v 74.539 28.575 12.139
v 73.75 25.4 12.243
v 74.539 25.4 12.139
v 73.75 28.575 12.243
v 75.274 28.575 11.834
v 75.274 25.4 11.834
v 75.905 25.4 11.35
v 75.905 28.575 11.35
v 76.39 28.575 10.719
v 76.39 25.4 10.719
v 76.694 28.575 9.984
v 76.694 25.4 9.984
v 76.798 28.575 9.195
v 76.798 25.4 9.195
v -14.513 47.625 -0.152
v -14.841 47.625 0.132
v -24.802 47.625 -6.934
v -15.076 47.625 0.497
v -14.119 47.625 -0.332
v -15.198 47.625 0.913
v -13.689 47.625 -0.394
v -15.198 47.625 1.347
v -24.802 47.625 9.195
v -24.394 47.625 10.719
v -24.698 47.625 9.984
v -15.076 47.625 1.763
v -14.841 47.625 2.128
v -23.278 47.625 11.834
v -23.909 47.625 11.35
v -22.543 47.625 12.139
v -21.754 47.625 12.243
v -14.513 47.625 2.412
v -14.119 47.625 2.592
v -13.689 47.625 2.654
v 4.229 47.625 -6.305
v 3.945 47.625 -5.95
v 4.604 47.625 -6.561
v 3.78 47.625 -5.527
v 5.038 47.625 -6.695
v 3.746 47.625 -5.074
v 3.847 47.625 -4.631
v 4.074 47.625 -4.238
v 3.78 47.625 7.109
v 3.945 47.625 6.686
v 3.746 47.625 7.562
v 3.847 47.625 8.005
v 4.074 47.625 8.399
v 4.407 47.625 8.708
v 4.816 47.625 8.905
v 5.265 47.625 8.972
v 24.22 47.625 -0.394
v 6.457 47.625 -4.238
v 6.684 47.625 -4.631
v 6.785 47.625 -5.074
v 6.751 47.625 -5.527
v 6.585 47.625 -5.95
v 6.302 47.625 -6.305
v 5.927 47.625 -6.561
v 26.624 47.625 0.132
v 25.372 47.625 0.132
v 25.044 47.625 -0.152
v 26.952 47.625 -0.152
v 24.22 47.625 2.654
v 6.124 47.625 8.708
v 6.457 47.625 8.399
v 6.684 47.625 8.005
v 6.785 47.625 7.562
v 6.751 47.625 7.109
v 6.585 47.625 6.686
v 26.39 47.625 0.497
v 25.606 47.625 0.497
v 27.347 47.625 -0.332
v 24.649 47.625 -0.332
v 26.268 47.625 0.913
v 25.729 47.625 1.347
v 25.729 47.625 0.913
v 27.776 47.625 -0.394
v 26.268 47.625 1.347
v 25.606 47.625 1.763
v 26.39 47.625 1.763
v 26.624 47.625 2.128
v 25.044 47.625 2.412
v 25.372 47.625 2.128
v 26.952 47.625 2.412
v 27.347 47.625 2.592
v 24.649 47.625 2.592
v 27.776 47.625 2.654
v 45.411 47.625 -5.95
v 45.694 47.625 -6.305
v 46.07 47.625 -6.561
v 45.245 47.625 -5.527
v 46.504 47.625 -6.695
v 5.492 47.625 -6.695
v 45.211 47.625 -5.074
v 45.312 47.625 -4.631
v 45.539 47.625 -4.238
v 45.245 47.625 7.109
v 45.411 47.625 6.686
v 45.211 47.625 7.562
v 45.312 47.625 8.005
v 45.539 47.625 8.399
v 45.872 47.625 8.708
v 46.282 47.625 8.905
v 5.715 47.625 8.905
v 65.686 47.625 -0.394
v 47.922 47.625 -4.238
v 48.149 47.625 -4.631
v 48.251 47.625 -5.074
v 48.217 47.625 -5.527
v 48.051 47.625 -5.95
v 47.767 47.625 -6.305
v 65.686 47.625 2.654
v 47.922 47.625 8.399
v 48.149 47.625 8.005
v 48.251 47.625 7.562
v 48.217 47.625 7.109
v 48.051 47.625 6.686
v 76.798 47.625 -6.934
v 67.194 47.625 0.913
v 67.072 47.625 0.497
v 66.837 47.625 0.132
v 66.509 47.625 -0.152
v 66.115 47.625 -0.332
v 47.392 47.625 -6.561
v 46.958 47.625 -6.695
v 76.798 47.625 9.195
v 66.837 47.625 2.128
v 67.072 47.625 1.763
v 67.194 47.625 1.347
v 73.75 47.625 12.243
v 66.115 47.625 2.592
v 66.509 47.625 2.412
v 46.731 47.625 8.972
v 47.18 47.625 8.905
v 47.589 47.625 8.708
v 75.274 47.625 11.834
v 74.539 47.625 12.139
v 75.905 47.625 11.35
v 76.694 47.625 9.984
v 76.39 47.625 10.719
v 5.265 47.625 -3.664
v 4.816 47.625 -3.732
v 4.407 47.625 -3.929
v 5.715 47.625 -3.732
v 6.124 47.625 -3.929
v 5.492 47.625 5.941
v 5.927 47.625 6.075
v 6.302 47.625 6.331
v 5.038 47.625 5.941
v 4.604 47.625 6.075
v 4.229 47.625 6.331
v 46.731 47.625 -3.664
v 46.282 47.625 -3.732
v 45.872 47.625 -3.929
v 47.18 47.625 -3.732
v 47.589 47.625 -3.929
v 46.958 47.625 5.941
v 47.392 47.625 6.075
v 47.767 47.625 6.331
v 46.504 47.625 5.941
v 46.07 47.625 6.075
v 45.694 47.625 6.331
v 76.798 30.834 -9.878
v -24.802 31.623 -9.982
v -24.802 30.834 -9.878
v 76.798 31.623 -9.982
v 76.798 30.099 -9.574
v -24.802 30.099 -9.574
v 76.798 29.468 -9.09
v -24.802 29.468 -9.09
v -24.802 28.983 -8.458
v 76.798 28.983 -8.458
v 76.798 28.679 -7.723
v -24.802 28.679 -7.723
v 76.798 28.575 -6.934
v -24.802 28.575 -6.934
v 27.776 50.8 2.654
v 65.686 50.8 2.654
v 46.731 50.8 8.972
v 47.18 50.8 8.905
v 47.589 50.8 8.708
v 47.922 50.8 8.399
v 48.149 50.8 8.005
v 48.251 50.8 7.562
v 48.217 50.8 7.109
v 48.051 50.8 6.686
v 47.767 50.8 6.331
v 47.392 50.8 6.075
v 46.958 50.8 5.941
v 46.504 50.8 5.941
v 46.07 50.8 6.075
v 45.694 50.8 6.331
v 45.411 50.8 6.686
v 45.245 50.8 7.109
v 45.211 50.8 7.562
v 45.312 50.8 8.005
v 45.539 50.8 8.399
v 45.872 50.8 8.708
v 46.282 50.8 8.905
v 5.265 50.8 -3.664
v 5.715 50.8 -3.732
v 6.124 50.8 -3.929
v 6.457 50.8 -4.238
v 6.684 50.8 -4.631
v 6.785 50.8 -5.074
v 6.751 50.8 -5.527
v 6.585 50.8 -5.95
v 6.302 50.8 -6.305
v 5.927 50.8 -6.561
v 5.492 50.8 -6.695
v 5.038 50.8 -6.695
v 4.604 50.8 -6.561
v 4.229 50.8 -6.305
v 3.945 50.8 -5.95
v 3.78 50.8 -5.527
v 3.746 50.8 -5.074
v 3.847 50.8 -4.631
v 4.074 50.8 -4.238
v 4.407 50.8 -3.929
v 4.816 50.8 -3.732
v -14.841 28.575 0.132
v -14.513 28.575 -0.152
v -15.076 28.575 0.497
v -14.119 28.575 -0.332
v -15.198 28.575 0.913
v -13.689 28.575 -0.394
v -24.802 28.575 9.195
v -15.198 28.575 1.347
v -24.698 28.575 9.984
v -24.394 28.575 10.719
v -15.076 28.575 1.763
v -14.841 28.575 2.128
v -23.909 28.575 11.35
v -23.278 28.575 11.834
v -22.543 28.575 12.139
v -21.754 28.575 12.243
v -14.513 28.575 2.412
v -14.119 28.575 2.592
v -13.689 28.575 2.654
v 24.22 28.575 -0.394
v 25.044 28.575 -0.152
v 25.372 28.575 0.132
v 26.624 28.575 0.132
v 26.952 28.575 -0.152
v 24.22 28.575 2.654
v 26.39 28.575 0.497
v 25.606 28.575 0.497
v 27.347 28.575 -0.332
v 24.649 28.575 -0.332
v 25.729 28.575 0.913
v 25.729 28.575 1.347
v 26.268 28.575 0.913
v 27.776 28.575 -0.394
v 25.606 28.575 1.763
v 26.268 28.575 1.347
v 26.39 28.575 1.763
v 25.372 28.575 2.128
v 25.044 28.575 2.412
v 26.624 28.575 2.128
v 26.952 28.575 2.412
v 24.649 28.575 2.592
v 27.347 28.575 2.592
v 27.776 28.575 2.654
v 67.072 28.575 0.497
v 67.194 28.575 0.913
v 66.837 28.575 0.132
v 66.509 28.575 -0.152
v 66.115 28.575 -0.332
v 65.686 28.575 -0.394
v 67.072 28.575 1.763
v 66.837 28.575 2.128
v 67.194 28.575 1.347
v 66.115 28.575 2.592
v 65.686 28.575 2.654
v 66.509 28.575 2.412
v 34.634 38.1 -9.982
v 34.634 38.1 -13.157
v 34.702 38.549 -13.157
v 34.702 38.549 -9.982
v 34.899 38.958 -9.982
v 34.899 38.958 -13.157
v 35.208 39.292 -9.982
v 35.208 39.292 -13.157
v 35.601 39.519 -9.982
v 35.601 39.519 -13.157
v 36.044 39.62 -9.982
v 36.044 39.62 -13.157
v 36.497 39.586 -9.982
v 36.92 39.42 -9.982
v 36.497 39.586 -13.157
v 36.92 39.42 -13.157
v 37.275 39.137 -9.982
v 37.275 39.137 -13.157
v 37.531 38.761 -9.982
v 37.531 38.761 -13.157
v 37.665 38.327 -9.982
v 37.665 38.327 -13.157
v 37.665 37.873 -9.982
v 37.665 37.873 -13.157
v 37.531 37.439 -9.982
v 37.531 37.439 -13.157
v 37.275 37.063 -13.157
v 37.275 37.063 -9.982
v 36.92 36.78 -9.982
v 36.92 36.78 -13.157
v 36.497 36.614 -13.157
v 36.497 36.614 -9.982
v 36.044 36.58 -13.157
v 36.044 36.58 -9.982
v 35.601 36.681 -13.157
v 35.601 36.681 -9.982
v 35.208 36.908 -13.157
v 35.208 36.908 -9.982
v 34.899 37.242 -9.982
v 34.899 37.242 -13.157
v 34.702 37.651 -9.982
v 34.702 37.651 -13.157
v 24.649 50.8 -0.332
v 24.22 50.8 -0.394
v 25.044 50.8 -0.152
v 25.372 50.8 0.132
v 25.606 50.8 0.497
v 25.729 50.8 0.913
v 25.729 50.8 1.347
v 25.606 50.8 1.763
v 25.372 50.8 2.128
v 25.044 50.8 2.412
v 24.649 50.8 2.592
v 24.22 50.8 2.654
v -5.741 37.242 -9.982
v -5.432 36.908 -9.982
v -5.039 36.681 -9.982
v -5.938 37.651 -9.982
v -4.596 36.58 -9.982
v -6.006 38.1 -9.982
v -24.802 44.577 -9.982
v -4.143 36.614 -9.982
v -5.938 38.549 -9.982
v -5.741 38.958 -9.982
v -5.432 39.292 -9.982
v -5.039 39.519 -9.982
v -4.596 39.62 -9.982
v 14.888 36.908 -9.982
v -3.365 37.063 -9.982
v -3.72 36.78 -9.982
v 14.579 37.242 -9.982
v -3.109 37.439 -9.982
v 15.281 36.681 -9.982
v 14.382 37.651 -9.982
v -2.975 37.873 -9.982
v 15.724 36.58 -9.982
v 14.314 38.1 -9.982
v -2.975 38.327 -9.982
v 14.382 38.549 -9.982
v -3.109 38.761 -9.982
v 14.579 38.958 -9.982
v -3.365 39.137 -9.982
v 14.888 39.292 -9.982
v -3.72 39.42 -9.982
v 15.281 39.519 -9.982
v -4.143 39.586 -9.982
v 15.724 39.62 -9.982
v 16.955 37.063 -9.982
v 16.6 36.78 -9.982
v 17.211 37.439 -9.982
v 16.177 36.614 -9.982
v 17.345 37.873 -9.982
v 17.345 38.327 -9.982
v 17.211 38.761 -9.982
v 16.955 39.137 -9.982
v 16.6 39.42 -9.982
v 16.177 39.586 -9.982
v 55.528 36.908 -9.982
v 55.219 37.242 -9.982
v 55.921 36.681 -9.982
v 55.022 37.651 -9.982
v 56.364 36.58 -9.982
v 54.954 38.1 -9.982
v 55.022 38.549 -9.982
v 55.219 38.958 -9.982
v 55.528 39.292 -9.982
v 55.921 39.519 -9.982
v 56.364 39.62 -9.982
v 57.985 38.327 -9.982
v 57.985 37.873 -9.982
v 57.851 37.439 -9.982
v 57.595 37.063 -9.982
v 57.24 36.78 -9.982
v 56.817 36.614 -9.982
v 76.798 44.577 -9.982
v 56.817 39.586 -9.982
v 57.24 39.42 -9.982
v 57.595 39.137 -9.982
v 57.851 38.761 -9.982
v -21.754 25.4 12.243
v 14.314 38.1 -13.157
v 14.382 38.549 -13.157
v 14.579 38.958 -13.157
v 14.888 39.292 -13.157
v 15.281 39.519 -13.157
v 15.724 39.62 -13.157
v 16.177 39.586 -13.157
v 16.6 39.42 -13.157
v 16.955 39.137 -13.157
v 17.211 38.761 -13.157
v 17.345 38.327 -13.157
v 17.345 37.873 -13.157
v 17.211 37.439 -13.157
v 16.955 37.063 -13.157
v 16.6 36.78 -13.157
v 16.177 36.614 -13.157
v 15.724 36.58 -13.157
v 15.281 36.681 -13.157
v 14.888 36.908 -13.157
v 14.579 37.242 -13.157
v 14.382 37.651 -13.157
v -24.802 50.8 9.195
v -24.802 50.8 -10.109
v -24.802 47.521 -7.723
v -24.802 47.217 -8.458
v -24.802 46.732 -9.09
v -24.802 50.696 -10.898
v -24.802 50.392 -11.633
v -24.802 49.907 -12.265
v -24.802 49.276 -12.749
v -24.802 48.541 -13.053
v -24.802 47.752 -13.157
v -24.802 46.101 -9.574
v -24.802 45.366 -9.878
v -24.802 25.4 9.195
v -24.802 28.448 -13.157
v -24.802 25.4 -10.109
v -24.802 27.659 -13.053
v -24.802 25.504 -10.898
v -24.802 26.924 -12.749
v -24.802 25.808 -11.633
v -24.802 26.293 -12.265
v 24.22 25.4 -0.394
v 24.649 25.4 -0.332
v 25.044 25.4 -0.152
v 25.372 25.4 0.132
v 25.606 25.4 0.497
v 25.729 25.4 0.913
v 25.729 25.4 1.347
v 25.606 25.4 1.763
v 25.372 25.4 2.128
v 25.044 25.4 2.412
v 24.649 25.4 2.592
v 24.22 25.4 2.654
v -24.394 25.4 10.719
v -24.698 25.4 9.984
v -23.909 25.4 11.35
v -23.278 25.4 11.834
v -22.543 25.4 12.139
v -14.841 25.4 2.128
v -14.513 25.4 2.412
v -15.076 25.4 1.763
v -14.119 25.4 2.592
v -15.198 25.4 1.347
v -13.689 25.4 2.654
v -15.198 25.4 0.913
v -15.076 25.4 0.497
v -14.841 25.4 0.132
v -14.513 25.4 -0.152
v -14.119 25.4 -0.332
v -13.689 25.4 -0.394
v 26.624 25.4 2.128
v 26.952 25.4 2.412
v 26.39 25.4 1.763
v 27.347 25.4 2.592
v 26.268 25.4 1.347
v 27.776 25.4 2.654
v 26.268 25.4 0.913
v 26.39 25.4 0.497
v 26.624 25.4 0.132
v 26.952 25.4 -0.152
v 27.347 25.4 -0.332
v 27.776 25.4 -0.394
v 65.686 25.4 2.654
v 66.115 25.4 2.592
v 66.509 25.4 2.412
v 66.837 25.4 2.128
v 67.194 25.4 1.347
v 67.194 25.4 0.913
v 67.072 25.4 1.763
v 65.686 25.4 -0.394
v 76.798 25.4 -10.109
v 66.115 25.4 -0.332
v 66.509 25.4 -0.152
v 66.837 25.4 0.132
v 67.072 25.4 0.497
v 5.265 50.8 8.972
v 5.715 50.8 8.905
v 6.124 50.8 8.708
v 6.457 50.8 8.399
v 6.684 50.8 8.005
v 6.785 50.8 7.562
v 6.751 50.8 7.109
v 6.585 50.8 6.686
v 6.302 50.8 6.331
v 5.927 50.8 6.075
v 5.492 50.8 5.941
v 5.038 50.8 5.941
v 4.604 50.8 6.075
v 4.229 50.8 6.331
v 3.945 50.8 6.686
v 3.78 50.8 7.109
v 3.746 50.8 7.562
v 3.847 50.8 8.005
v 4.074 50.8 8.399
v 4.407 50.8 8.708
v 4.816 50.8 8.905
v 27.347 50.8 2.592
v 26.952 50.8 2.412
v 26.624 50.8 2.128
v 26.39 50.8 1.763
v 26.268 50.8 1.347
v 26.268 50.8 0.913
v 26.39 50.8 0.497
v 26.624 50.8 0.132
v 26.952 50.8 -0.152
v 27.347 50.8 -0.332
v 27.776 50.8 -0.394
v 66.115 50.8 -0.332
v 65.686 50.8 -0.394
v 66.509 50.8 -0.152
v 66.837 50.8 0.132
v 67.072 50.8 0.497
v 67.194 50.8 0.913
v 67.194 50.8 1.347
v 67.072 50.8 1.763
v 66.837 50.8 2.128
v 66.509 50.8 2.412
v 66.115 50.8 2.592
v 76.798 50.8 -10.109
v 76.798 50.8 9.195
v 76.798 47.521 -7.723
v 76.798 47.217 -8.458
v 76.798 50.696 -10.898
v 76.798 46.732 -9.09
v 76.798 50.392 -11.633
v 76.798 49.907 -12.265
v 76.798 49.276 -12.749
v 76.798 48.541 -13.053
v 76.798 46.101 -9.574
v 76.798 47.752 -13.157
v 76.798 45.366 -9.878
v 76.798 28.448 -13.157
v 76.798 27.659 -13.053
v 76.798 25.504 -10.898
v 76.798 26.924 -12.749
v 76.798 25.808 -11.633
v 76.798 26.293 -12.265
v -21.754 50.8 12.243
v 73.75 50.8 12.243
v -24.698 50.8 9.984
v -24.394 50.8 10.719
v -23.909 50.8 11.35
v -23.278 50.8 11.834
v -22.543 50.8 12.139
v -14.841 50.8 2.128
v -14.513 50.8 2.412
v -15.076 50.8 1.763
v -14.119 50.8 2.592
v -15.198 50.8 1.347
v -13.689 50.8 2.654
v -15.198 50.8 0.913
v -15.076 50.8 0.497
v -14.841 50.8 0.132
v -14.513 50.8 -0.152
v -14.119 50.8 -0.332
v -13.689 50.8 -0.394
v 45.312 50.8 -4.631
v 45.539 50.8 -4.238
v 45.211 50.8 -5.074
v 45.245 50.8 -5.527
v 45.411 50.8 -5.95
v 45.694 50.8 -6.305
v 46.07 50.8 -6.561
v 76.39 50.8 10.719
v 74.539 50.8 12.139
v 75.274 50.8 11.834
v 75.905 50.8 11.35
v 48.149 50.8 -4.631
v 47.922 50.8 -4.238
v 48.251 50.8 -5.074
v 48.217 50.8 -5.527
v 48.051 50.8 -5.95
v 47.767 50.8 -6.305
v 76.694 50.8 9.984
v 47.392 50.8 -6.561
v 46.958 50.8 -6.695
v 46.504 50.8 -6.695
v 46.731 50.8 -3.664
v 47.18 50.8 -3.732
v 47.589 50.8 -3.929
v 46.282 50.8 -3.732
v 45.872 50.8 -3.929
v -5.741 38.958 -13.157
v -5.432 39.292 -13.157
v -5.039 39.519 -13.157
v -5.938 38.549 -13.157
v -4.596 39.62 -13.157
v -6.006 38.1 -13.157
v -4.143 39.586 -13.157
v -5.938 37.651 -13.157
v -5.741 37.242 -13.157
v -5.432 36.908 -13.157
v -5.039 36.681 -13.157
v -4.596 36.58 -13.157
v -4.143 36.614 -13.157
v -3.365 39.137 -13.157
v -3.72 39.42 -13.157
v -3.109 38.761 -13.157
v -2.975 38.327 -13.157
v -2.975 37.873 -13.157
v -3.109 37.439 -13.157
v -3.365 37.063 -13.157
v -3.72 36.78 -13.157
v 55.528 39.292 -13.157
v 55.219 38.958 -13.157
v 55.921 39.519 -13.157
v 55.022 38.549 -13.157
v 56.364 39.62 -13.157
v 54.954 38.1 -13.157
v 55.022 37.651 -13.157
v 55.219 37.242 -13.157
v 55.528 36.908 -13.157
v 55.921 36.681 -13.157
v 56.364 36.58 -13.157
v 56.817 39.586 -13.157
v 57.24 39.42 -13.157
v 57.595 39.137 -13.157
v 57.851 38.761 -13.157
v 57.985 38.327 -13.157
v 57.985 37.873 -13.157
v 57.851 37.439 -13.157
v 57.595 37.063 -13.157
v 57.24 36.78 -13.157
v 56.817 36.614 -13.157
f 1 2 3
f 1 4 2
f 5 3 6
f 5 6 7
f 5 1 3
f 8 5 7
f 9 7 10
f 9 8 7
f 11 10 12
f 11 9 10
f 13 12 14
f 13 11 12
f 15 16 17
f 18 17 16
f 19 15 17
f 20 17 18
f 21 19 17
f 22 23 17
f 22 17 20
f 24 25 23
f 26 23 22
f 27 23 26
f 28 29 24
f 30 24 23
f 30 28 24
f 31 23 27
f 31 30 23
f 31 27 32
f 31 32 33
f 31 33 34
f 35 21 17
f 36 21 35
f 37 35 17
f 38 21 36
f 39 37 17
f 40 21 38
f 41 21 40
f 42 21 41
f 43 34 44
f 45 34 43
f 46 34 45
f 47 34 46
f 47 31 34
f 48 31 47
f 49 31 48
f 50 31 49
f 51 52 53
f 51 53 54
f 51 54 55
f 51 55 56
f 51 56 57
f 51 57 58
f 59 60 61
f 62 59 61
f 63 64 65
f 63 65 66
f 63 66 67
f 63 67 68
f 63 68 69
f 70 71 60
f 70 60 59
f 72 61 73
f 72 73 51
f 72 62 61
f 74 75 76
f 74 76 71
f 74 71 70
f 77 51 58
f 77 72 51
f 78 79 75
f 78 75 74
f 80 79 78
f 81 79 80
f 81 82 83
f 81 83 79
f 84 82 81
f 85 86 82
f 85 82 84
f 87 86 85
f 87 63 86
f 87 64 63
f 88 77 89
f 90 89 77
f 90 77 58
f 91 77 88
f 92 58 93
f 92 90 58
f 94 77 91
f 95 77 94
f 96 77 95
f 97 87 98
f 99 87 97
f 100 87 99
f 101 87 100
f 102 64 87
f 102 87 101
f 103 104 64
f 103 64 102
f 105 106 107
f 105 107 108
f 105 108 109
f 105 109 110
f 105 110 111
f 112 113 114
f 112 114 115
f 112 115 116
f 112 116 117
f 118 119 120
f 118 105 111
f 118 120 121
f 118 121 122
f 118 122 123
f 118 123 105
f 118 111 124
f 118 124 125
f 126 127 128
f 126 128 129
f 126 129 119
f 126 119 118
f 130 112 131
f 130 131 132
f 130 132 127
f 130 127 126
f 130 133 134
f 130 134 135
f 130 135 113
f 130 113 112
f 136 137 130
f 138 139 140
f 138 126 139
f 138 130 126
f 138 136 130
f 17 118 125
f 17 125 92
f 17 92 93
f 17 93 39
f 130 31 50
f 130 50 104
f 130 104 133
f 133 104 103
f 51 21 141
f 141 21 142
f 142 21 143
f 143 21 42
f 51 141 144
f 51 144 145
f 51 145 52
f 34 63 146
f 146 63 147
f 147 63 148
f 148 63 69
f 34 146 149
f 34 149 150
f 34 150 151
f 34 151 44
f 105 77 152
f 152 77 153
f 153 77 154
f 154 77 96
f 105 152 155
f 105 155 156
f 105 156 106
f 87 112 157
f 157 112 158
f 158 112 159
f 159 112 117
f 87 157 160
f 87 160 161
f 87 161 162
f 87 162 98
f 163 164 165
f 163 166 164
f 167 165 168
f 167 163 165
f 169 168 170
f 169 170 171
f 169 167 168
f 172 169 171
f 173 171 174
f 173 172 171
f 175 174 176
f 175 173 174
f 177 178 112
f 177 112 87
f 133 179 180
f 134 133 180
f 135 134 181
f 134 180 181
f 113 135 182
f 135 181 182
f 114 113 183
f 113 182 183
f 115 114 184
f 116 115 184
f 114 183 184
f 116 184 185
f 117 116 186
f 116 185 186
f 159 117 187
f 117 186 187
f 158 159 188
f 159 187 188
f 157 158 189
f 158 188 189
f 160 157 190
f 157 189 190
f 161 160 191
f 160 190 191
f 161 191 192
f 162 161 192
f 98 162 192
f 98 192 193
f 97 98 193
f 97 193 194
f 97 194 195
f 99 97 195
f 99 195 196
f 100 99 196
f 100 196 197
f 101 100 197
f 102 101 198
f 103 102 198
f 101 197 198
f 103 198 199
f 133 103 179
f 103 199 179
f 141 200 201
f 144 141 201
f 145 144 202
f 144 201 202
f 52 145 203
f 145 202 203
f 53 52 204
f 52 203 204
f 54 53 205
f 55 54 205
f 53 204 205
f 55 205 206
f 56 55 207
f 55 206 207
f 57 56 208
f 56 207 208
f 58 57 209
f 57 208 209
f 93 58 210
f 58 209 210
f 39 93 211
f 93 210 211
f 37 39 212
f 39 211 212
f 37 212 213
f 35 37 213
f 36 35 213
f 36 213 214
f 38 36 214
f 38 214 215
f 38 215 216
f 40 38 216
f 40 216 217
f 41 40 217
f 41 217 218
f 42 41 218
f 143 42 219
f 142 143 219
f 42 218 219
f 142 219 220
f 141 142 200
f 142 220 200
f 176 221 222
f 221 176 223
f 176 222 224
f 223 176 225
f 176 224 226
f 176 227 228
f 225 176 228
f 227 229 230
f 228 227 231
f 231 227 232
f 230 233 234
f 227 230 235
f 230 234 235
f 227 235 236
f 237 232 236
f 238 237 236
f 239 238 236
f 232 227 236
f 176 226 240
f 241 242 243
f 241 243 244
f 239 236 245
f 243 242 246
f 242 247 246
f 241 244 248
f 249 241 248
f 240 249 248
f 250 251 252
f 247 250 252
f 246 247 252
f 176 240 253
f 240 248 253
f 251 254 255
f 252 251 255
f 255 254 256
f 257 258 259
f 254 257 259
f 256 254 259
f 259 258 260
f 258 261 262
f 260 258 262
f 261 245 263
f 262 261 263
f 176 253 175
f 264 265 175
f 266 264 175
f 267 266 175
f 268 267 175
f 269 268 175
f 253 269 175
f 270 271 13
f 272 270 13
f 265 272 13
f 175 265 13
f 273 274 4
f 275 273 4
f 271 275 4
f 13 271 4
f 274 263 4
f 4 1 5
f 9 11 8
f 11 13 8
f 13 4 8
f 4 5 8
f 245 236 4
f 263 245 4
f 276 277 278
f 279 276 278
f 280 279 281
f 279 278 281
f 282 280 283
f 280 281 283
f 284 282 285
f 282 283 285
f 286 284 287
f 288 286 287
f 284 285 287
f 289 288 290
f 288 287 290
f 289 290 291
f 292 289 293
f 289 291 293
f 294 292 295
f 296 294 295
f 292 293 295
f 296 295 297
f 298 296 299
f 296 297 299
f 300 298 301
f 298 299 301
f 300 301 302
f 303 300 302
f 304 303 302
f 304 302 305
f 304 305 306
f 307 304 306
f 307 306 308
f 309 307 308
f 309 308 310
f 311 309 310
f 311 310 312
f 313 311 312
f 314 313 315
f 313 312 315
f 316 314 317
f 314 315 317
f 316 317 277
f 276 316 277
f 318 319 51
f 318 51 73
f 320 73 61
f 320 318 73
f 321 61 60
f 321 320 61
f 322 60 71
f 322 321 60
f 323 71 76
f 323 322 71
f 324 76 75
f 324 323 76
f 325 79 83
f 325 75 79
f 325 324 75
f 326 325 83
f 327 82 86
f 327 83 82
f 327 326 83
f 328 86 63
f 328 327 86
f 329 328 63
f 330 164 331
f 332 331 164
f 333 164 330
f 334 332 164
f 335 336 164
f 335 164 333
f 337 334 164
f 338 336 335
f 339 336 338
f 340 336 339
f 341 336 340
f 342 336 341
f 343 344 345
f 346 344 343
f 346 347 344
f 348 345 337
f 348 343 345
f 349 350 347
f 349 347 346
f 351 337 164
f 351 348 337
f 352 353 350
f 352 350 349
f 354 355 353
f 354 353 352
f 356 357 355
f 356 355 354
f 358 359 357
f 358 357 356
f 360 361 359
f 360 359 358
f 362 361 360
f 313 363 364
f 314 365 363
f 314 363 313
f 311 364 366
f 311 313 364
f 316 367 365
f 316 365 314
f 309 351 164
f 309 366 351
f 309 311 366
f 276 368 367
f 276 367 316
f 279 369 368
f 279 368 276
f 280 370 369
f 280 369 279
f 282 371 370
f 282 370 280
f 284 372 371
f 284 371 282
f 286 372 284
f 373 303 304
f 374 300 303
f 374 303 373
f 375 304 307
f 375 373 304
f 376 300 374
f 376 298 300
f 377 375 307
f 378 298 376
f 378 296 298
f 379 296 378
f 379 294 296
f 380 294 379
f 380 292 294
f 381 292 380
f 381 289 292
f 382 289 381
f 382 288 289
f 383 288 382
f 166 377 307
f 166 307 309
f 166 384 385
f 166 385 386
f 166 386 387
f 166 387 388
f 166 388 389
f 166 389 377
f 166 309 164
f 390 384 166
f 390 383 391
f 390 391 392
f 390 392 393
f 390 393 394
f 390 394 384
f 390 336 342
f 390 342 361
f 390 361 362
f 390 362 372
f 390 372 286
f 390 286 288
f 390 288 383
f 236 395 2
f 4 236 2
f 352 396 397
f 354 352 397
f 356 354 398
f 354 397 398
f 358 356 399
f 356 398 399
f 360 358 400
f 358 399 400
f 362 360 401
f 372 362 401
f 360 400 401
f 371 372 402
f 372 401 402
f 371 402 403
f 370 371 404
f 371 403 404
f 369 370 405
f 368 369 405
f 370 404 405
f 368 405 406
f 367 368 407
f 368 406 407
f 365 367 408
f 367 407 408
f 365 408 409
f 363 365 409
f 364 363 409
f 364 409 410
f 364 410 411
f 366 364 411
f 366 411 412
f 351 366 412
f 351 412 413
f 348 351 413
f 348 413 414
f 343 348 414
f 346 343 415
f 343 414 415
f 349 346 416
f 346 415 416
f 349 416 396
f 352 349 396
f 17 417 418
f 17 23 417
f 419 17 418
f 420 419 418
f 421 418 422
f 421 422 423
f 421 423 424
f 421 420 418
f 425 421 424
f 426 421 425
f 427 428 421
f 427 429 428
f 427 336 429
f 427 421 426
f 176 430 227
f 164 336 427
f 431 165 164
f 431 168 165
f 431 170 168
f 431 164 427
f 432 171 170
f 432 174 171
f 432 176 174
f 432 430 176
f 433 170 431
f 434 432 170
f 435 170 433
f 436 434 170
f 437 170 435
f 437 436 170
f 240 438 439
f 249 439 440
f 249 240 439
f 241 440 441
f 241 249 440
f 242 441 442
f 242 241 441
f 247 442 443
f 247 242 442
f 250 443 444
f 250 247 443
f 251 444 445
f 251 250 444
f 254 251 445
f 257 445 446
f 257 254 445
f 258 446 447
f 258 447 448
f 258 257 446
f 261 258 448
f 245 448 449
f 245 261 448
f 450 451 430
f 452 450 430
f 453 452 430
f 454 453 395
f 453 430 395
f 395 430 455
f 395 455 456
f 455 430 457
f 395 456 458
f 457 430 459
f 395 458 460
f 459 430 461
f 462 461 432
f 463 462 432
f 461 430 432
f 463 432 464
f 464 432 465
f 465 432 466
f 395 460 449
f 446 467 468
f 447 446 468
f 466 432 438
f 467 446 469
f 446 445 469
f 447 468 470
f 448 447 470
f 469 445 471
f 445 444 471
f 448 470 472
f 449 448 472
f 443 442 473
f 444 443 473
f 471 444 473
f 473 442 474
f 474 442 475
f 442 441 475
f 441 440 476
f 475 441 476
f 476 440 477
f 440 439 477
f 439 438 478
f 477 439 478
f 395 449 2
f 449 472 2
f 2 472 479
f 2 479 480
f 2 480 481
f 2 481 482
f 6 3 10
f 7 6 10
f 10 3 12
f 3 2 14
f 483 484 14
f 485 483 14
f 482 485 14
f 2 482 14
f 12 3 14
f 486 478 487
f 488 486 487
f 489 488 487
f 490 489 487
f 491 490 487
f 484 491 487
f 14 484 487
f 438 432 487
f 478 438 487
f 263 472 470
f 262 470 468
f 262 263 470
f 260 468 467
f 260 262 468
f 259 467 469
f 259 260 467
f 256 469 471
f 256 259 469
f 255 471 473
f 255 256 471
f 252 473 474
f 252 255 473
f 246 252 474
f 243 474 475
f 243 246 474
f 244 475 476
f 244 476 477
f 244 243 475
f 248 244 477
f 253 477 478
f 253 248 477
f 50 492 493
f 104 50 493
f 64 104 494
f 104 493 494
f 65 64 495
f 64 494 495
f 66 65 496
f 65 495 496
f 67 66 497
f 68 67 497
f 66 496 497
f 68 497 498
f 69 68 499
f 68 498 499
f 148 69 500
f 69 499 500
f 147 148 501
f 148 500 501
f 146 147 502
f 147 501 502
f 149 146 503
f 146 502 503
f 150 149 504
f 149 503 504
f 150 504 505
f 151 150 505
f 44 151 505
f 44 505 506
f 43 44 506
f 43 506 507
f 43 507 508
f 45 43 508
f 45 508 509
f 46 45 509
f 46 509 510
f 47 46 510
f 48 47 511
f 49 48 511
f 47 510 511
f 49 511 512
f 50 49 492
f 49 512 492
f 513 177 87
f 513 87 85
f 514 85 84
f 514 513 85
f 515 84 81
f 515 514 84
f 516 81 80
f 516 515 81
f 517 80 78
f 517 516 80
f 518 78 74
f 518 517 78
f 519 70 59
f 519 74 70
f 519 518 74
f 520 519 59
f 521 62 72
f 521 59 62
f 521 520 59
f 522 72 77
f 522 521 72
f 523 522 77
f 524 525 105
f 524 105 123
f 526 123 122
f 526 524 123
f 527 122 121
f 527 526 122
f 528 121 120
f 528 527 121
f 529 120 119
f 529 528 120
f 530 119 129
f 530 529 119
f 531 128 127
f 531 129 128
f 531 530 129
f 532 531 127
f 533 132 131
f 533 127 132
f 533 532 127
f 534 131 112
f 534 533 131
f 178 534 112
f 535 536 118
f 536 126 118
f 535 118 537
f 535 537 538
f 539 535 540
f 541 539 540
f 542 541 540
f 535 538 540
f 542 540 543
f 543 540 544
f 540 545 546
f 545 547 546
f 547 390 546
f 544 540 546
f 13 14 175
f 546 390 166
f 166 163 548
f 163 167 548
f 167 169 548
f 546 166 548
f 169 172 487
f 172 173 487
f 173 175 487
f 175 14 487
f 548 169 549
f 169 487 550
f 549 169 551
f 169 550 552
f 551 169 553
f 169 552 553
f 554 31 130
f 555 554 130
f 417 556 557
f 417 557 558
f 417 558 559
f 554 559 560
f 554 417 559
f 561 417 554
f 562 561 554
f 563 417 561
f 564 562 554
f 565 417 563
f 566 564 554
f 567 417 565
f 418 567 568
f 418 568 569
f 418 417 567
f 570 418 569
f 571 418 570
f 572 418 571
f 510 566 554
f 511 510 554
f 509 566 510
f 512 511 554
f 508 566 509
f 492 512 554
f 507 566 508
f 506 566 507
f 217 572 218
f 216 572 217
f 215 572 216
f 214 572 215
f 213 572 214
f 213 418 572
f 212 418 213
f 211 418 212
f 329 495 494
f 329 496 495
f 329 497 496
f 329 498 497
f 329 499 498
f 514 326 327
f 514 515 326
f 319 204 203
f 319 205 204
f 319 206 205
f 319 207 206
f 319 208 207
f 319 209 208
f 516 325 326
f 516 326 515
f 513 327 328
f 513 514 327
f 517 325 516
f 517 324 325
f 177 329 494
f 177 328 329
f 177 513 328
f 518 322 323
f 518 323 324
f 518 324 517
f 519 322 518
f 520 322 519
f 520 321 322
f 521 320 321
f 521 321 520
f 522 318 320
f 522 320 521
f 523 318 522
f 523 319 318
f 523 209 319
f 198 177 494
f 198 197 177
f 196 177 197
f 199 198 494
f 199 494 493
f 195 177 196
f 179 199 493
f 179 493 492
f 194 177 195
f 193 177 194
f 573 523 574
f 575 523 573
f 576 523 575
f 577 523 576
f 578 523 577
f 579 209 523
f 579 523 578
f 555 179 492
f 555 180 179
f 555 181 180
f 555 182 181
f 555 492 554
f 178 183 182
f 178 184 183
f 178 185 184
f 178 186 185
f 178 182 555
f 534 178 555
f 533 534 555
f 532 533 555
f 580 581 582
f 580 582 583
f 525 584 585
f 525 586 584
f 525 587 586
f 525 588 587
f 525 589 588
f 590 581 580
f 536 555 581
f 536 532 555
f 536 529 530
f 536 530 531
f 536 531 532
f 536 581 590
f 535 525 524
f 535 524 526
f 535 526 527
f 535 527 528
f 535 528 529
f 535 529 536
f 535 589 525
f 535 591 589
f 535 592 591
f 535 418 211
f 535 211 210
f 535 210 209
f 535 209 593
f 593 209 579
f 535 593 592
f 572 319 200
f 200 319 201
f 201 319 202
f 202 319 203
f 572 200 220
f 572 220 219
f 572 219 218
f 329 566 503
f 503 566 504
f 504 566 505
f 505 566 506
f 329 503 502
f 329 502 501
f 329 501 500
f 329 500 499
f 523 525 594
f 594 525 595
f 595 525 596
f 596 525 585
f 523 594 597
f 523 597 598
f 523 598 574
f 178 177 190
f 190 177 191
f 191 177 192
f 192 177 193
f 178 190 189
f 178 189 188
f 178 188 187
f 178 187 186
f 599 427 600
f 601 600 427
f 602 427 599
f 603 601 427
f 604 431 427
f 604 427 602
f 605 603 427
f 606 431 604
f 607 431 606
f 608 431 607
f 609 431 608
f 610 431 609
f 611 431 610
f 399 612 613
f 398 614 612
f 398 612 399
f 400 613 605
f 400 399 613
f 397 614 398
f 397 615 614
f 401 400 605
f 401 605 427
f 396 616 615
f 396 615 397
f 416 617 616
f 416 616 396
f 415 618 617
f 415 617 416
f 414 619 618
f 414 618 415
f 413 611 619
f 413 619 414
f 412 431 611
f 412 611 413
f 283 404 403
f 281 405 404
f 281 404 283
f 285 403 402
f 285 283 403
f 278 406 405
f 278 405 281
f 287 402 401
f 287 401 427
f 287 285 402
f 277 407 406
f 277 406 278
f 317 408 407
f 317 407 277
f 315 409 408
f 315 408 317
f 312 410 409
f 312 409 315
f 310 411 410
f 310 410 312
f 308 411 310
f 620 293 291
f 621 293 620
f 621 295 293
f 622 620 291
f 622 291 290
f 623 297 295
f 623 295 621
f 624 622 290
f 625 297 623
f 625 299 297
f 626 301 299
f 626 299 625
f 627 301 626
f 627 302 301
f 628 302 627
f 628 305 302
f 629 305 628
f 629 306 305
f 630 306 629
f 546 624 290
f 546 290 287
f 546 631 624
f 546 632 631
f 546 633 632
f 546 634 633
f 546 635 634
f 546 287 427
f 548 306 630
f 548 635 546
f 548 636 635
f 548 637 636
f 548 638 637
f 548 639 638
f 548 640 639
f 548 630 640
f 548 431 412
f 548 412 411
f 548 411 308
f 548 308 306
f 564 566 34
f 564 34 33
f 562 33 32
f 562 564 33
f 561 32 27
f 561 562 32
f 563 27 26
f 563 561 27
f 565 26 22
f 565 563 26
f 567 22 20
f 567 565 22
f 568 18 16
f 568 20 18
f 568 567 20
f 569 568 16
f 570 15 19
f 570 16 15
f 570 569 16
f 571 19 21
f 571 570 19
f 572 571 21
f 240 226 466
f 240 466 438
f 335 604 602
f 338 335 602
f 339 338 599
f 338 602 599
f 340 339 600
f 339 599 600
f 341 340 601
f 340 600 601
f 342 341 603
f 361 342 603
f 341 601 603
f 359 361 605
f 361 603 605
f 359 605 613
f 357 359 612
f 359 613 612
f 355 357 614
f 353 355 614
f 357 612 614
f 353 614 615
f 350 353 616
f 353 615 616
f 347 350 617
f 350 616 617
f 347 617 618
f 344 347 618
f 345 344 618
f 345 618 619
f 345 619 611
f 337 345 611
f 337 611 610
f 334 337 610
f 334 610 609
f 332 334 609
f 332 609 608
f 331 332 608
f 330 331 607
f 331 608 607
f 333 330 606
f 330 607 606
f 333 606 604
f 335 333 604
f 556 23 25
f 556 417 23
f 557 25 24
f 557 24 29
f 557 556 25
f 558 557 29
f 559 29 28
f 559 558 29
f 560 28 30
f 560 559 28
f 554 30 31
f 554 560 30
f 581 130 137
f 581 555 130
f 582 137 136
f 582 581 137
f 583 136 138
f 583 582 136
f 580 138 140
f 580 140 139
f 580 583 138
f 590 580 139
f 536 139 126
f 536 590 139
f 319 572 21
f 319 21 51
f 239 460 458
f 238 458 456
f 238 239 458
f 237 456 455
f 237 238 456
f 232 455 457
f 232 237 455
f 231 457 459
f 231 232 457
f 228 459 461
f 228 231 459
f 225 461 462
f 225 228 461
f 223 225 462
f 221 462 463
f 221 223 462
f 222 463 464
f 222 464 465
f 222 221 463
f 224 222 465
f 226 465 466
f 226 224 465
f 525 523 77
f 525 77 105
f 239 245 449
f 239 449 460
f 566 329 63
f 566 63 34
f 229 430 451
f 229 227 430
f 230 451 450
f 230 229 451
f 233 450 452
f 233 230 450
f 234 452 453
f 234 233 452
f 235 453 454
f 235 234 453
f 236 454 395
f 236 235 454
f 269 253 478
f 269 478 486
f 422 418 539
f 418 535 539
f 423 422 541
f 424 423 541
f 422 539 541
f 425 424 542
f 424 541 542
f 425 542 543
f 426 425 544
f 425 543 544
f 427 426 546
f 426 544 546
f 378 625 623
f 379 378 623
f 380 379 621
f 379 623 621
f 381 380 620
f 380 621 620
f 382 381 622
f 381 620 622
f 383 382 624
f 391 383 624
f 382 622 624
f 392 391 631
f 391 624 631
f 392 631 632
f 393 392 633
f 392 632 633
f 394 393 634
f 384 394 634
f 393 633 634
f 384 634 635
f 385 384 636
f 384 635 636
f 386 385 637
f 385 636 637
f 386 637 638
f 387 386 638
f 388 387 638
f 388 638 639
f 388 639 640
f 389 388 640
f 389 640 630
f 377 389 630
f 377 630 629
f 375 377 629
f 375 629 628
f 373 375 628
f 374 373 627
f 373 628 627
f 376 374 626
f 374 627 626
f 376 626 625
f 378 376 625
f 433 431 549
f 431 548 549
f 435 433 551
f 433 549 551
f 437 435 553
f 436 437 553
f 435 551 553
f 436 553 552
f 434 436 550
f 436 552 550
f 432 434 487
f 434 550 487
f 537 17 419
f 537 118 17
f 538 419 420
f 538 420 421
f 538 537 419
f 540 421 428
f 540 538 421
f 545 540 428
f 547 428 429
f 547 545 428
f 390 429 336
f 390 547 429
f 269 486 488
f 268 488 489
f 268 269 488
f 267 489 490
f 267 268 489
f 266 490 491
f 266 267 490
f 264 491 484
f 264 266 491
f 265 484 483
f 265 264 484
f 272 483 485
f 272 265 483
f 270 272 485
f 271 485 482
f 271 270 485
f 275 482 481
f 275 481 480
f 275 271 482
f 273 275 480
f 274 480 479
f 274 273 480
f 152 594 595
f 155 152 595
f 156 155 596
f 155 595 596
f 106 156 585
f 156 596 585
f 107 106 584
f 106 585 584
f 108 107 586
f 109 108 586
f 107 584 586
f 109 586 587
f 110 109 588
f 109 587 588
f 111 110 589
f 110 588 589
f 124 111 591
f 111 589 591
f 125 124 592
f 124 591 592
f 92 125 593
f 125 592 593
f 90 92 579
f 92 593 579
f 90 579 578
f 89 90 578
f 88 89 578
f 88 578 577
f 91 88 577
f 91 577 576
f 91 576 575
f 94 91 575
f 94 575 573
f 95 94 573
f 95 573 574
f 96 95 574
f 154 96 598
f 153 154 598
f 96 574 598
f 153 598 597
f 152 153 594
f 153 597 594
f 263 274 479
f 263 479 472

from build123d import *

# Parameters (mm, degrees)
SKETCH2_W           = 101.6
SKETCH2_H           = 25.4
BOSS_EXTRUDE1_DEPTH = 25.4
SKETCH3_W           = 101.6
SKETCH3_H           = 19.05
CUT_EXTRUDE1_DEPTH  = 22.225
CUT_EXTRUDE2_DEPTH  = 25.4
CUT_EXTRUDE3_DEPTH  = 25.4
SKETCH6_R           = 1.524
CUT_EXTRUDE4_DEPTH  = 3.175
SKETCH7_R           = 1.524
CUT_EXTRUDE5_DEPTH  = 3.175
FILLET1_R           = 3.048
FILLET2_R           = 3.048
FILLET3_R           = 3.048


with BuildPart() as part:
    # Sketch2 → Boss-Extrude1 (new body)
    with BuildSketch(Plane(origin=(0, 25.4, 0), x_dir=(1, 0, 0), z_dir=(0, 1, 0))):
        with Locations((25.998060942, 0.45734072)):
            Rectangle(SKETCH2_W, SKETCH2_H)
    extrude(amount=BOSS_EXTRUDE1_DEPTH)

    # Sketch3 → Cut-Extrude1 (cut)
    with BuildSketch(Plane.XY.offset(12.24265928)):
        with Locations((25.998060942, 38.1)):
            Rectangle(SKETCH3_W, SKETCH3_H)
    extrude(amount=-CUT_EXTRUDE1_DEPTH, mode=Mode.SUBTRACT)

    # Sketch4 → Cut-Extrude2 (cut)
    with BuildSketch(Plane(origin=(0, 50.8, 0), x_dir=(1, 0, 0), z_dir=(0, 1, 0))):
        with BuildLine():
            Line((-13.689439058, 0.39384072), (24.220060942, 0.39384072))
            ThreePointArc((24.220060942, 0.39384072), (25.744060942, -1.13015928), (24.220060942, -2.65415928))
            Line((24.220060942, -2.65415928), (-13.689439058, -2.65415928))
            ThreePointArc((-13.689439058, -2.65415928), (-15.213439058, -1.13015928), (-13.689439058, 0.39384072))
        make_face()
    extrude(amount=-CUT_EXTRUDE2_DEPTH, mode=Mode.SUBTRACT)

    # Sketch5 → Cut-Extrude3 (cut)
    with BuildSketch(Plane(origin=(0, 50.8, 0), x_dir=(1, 0, 0), z_dir=(0, 1, 0))):
        with BuildLine():
            Line((27.776060942, 0.39384072), (65.685560942, 0.39384072))
            ThreePointArc((65.685560942, 0.39384072), (67.209560942, -1.13015928), (65.685560942, -2.65415928))
            Line((65.685560942, -2.65415928), (27.776060942, -2.65415928))
            ThreePointArc((27.776060942, -2.65415928), (26.252060942, -1.13015928), (27.776060942, 0.39384072))
        make_face()
    extrude(amount=-CUT_EXTRUDE3_DEPTH, mode=Mode.SUBTRACT)

    # Sketch6 → Cut-Extrude4 (cut)
    with BuildSketch(Plane(origin=(0, 50.8, 0), x_dir=(1, 0, 0), z_dir=(0, 1, 0))):
        with Locations(Location((5.265310942, -7.44840928, 0), (0, 0, 270))):
            Circle(SKETCH6_R)
        with Locations(Location((5.265310942, 5.18809072, 0), (0, 0, 270))):
            Circle(SKETCH6_R)
        with Locations(Location((46.730810942, 5.18809072, 0), (0, 0, 270))):
            Circle(SKETCH6_R)
        with Locations(Location((46.730810942, -7.44840928, 0), (0, 0, 270))):
            Circle(SKETCH6_R)
    extrude(amount=-CUT_EXTRUDE4_DEPTH, mode=Mode.SUBTRACT)

    # Sketch7 → Cut-Extrude5 (cut)
    with BuildSketch(Plane(origin=(0, 0, -13.15734072), x_dir=(-1, 0, 0), z_dir=(0, 0, -1))):
        with Locations((-56.478060942, 38.1)):
            Circle(SKETCH7_R)
        with Locations((-36.158060942, 38.1)):
            Circle(SKETCH7_R)
        with Locations((-15.838060942, 38.1)):
            Circle(SKETCH7_R)
        with Locations((4.481939058, 38.1)):
            Circle(SKETCH7_R)
    extrude(amount=-CUT_EXTRUDE5_DEPTH, mode=Mode.SUBTRACT)

    # Fillet1
    fillet1_edges = [part.edges().sort_by_distance(p)[0] for p in [
        (25.998060942, 47.625, -9.98234072),
        (25.998060942, 28.575, -9.98234072),
    ]]
    fillet(fillet1_edges, radius=FILLET1_R)

    # Fillet2
    fillet2_edges = [part.edges().sort_by_distance(p)[0] for p in [
        (25.998060942, 50.8, -13.15734072),
        (25.998060942, 25.4, -13.15734072),
    ]]
    fillet(fillet2_edges, radius=FILLET2_R)

    # Fillet3
    fillet3_edges = [part.edges().sort_by_distance(p)[0] for p in [
        (76.798060942, 26.9875, 12.24265928),
        (-24.801939058, 26.9875, 12.24265928),
        (76.798060942, 49.2125, 12.24265928),
        (-24.801939058, 49.2125, 12.24265928),
    ]]
    fillet(fillet3_edges, radius=FILLET3_R)


solid = part.part
